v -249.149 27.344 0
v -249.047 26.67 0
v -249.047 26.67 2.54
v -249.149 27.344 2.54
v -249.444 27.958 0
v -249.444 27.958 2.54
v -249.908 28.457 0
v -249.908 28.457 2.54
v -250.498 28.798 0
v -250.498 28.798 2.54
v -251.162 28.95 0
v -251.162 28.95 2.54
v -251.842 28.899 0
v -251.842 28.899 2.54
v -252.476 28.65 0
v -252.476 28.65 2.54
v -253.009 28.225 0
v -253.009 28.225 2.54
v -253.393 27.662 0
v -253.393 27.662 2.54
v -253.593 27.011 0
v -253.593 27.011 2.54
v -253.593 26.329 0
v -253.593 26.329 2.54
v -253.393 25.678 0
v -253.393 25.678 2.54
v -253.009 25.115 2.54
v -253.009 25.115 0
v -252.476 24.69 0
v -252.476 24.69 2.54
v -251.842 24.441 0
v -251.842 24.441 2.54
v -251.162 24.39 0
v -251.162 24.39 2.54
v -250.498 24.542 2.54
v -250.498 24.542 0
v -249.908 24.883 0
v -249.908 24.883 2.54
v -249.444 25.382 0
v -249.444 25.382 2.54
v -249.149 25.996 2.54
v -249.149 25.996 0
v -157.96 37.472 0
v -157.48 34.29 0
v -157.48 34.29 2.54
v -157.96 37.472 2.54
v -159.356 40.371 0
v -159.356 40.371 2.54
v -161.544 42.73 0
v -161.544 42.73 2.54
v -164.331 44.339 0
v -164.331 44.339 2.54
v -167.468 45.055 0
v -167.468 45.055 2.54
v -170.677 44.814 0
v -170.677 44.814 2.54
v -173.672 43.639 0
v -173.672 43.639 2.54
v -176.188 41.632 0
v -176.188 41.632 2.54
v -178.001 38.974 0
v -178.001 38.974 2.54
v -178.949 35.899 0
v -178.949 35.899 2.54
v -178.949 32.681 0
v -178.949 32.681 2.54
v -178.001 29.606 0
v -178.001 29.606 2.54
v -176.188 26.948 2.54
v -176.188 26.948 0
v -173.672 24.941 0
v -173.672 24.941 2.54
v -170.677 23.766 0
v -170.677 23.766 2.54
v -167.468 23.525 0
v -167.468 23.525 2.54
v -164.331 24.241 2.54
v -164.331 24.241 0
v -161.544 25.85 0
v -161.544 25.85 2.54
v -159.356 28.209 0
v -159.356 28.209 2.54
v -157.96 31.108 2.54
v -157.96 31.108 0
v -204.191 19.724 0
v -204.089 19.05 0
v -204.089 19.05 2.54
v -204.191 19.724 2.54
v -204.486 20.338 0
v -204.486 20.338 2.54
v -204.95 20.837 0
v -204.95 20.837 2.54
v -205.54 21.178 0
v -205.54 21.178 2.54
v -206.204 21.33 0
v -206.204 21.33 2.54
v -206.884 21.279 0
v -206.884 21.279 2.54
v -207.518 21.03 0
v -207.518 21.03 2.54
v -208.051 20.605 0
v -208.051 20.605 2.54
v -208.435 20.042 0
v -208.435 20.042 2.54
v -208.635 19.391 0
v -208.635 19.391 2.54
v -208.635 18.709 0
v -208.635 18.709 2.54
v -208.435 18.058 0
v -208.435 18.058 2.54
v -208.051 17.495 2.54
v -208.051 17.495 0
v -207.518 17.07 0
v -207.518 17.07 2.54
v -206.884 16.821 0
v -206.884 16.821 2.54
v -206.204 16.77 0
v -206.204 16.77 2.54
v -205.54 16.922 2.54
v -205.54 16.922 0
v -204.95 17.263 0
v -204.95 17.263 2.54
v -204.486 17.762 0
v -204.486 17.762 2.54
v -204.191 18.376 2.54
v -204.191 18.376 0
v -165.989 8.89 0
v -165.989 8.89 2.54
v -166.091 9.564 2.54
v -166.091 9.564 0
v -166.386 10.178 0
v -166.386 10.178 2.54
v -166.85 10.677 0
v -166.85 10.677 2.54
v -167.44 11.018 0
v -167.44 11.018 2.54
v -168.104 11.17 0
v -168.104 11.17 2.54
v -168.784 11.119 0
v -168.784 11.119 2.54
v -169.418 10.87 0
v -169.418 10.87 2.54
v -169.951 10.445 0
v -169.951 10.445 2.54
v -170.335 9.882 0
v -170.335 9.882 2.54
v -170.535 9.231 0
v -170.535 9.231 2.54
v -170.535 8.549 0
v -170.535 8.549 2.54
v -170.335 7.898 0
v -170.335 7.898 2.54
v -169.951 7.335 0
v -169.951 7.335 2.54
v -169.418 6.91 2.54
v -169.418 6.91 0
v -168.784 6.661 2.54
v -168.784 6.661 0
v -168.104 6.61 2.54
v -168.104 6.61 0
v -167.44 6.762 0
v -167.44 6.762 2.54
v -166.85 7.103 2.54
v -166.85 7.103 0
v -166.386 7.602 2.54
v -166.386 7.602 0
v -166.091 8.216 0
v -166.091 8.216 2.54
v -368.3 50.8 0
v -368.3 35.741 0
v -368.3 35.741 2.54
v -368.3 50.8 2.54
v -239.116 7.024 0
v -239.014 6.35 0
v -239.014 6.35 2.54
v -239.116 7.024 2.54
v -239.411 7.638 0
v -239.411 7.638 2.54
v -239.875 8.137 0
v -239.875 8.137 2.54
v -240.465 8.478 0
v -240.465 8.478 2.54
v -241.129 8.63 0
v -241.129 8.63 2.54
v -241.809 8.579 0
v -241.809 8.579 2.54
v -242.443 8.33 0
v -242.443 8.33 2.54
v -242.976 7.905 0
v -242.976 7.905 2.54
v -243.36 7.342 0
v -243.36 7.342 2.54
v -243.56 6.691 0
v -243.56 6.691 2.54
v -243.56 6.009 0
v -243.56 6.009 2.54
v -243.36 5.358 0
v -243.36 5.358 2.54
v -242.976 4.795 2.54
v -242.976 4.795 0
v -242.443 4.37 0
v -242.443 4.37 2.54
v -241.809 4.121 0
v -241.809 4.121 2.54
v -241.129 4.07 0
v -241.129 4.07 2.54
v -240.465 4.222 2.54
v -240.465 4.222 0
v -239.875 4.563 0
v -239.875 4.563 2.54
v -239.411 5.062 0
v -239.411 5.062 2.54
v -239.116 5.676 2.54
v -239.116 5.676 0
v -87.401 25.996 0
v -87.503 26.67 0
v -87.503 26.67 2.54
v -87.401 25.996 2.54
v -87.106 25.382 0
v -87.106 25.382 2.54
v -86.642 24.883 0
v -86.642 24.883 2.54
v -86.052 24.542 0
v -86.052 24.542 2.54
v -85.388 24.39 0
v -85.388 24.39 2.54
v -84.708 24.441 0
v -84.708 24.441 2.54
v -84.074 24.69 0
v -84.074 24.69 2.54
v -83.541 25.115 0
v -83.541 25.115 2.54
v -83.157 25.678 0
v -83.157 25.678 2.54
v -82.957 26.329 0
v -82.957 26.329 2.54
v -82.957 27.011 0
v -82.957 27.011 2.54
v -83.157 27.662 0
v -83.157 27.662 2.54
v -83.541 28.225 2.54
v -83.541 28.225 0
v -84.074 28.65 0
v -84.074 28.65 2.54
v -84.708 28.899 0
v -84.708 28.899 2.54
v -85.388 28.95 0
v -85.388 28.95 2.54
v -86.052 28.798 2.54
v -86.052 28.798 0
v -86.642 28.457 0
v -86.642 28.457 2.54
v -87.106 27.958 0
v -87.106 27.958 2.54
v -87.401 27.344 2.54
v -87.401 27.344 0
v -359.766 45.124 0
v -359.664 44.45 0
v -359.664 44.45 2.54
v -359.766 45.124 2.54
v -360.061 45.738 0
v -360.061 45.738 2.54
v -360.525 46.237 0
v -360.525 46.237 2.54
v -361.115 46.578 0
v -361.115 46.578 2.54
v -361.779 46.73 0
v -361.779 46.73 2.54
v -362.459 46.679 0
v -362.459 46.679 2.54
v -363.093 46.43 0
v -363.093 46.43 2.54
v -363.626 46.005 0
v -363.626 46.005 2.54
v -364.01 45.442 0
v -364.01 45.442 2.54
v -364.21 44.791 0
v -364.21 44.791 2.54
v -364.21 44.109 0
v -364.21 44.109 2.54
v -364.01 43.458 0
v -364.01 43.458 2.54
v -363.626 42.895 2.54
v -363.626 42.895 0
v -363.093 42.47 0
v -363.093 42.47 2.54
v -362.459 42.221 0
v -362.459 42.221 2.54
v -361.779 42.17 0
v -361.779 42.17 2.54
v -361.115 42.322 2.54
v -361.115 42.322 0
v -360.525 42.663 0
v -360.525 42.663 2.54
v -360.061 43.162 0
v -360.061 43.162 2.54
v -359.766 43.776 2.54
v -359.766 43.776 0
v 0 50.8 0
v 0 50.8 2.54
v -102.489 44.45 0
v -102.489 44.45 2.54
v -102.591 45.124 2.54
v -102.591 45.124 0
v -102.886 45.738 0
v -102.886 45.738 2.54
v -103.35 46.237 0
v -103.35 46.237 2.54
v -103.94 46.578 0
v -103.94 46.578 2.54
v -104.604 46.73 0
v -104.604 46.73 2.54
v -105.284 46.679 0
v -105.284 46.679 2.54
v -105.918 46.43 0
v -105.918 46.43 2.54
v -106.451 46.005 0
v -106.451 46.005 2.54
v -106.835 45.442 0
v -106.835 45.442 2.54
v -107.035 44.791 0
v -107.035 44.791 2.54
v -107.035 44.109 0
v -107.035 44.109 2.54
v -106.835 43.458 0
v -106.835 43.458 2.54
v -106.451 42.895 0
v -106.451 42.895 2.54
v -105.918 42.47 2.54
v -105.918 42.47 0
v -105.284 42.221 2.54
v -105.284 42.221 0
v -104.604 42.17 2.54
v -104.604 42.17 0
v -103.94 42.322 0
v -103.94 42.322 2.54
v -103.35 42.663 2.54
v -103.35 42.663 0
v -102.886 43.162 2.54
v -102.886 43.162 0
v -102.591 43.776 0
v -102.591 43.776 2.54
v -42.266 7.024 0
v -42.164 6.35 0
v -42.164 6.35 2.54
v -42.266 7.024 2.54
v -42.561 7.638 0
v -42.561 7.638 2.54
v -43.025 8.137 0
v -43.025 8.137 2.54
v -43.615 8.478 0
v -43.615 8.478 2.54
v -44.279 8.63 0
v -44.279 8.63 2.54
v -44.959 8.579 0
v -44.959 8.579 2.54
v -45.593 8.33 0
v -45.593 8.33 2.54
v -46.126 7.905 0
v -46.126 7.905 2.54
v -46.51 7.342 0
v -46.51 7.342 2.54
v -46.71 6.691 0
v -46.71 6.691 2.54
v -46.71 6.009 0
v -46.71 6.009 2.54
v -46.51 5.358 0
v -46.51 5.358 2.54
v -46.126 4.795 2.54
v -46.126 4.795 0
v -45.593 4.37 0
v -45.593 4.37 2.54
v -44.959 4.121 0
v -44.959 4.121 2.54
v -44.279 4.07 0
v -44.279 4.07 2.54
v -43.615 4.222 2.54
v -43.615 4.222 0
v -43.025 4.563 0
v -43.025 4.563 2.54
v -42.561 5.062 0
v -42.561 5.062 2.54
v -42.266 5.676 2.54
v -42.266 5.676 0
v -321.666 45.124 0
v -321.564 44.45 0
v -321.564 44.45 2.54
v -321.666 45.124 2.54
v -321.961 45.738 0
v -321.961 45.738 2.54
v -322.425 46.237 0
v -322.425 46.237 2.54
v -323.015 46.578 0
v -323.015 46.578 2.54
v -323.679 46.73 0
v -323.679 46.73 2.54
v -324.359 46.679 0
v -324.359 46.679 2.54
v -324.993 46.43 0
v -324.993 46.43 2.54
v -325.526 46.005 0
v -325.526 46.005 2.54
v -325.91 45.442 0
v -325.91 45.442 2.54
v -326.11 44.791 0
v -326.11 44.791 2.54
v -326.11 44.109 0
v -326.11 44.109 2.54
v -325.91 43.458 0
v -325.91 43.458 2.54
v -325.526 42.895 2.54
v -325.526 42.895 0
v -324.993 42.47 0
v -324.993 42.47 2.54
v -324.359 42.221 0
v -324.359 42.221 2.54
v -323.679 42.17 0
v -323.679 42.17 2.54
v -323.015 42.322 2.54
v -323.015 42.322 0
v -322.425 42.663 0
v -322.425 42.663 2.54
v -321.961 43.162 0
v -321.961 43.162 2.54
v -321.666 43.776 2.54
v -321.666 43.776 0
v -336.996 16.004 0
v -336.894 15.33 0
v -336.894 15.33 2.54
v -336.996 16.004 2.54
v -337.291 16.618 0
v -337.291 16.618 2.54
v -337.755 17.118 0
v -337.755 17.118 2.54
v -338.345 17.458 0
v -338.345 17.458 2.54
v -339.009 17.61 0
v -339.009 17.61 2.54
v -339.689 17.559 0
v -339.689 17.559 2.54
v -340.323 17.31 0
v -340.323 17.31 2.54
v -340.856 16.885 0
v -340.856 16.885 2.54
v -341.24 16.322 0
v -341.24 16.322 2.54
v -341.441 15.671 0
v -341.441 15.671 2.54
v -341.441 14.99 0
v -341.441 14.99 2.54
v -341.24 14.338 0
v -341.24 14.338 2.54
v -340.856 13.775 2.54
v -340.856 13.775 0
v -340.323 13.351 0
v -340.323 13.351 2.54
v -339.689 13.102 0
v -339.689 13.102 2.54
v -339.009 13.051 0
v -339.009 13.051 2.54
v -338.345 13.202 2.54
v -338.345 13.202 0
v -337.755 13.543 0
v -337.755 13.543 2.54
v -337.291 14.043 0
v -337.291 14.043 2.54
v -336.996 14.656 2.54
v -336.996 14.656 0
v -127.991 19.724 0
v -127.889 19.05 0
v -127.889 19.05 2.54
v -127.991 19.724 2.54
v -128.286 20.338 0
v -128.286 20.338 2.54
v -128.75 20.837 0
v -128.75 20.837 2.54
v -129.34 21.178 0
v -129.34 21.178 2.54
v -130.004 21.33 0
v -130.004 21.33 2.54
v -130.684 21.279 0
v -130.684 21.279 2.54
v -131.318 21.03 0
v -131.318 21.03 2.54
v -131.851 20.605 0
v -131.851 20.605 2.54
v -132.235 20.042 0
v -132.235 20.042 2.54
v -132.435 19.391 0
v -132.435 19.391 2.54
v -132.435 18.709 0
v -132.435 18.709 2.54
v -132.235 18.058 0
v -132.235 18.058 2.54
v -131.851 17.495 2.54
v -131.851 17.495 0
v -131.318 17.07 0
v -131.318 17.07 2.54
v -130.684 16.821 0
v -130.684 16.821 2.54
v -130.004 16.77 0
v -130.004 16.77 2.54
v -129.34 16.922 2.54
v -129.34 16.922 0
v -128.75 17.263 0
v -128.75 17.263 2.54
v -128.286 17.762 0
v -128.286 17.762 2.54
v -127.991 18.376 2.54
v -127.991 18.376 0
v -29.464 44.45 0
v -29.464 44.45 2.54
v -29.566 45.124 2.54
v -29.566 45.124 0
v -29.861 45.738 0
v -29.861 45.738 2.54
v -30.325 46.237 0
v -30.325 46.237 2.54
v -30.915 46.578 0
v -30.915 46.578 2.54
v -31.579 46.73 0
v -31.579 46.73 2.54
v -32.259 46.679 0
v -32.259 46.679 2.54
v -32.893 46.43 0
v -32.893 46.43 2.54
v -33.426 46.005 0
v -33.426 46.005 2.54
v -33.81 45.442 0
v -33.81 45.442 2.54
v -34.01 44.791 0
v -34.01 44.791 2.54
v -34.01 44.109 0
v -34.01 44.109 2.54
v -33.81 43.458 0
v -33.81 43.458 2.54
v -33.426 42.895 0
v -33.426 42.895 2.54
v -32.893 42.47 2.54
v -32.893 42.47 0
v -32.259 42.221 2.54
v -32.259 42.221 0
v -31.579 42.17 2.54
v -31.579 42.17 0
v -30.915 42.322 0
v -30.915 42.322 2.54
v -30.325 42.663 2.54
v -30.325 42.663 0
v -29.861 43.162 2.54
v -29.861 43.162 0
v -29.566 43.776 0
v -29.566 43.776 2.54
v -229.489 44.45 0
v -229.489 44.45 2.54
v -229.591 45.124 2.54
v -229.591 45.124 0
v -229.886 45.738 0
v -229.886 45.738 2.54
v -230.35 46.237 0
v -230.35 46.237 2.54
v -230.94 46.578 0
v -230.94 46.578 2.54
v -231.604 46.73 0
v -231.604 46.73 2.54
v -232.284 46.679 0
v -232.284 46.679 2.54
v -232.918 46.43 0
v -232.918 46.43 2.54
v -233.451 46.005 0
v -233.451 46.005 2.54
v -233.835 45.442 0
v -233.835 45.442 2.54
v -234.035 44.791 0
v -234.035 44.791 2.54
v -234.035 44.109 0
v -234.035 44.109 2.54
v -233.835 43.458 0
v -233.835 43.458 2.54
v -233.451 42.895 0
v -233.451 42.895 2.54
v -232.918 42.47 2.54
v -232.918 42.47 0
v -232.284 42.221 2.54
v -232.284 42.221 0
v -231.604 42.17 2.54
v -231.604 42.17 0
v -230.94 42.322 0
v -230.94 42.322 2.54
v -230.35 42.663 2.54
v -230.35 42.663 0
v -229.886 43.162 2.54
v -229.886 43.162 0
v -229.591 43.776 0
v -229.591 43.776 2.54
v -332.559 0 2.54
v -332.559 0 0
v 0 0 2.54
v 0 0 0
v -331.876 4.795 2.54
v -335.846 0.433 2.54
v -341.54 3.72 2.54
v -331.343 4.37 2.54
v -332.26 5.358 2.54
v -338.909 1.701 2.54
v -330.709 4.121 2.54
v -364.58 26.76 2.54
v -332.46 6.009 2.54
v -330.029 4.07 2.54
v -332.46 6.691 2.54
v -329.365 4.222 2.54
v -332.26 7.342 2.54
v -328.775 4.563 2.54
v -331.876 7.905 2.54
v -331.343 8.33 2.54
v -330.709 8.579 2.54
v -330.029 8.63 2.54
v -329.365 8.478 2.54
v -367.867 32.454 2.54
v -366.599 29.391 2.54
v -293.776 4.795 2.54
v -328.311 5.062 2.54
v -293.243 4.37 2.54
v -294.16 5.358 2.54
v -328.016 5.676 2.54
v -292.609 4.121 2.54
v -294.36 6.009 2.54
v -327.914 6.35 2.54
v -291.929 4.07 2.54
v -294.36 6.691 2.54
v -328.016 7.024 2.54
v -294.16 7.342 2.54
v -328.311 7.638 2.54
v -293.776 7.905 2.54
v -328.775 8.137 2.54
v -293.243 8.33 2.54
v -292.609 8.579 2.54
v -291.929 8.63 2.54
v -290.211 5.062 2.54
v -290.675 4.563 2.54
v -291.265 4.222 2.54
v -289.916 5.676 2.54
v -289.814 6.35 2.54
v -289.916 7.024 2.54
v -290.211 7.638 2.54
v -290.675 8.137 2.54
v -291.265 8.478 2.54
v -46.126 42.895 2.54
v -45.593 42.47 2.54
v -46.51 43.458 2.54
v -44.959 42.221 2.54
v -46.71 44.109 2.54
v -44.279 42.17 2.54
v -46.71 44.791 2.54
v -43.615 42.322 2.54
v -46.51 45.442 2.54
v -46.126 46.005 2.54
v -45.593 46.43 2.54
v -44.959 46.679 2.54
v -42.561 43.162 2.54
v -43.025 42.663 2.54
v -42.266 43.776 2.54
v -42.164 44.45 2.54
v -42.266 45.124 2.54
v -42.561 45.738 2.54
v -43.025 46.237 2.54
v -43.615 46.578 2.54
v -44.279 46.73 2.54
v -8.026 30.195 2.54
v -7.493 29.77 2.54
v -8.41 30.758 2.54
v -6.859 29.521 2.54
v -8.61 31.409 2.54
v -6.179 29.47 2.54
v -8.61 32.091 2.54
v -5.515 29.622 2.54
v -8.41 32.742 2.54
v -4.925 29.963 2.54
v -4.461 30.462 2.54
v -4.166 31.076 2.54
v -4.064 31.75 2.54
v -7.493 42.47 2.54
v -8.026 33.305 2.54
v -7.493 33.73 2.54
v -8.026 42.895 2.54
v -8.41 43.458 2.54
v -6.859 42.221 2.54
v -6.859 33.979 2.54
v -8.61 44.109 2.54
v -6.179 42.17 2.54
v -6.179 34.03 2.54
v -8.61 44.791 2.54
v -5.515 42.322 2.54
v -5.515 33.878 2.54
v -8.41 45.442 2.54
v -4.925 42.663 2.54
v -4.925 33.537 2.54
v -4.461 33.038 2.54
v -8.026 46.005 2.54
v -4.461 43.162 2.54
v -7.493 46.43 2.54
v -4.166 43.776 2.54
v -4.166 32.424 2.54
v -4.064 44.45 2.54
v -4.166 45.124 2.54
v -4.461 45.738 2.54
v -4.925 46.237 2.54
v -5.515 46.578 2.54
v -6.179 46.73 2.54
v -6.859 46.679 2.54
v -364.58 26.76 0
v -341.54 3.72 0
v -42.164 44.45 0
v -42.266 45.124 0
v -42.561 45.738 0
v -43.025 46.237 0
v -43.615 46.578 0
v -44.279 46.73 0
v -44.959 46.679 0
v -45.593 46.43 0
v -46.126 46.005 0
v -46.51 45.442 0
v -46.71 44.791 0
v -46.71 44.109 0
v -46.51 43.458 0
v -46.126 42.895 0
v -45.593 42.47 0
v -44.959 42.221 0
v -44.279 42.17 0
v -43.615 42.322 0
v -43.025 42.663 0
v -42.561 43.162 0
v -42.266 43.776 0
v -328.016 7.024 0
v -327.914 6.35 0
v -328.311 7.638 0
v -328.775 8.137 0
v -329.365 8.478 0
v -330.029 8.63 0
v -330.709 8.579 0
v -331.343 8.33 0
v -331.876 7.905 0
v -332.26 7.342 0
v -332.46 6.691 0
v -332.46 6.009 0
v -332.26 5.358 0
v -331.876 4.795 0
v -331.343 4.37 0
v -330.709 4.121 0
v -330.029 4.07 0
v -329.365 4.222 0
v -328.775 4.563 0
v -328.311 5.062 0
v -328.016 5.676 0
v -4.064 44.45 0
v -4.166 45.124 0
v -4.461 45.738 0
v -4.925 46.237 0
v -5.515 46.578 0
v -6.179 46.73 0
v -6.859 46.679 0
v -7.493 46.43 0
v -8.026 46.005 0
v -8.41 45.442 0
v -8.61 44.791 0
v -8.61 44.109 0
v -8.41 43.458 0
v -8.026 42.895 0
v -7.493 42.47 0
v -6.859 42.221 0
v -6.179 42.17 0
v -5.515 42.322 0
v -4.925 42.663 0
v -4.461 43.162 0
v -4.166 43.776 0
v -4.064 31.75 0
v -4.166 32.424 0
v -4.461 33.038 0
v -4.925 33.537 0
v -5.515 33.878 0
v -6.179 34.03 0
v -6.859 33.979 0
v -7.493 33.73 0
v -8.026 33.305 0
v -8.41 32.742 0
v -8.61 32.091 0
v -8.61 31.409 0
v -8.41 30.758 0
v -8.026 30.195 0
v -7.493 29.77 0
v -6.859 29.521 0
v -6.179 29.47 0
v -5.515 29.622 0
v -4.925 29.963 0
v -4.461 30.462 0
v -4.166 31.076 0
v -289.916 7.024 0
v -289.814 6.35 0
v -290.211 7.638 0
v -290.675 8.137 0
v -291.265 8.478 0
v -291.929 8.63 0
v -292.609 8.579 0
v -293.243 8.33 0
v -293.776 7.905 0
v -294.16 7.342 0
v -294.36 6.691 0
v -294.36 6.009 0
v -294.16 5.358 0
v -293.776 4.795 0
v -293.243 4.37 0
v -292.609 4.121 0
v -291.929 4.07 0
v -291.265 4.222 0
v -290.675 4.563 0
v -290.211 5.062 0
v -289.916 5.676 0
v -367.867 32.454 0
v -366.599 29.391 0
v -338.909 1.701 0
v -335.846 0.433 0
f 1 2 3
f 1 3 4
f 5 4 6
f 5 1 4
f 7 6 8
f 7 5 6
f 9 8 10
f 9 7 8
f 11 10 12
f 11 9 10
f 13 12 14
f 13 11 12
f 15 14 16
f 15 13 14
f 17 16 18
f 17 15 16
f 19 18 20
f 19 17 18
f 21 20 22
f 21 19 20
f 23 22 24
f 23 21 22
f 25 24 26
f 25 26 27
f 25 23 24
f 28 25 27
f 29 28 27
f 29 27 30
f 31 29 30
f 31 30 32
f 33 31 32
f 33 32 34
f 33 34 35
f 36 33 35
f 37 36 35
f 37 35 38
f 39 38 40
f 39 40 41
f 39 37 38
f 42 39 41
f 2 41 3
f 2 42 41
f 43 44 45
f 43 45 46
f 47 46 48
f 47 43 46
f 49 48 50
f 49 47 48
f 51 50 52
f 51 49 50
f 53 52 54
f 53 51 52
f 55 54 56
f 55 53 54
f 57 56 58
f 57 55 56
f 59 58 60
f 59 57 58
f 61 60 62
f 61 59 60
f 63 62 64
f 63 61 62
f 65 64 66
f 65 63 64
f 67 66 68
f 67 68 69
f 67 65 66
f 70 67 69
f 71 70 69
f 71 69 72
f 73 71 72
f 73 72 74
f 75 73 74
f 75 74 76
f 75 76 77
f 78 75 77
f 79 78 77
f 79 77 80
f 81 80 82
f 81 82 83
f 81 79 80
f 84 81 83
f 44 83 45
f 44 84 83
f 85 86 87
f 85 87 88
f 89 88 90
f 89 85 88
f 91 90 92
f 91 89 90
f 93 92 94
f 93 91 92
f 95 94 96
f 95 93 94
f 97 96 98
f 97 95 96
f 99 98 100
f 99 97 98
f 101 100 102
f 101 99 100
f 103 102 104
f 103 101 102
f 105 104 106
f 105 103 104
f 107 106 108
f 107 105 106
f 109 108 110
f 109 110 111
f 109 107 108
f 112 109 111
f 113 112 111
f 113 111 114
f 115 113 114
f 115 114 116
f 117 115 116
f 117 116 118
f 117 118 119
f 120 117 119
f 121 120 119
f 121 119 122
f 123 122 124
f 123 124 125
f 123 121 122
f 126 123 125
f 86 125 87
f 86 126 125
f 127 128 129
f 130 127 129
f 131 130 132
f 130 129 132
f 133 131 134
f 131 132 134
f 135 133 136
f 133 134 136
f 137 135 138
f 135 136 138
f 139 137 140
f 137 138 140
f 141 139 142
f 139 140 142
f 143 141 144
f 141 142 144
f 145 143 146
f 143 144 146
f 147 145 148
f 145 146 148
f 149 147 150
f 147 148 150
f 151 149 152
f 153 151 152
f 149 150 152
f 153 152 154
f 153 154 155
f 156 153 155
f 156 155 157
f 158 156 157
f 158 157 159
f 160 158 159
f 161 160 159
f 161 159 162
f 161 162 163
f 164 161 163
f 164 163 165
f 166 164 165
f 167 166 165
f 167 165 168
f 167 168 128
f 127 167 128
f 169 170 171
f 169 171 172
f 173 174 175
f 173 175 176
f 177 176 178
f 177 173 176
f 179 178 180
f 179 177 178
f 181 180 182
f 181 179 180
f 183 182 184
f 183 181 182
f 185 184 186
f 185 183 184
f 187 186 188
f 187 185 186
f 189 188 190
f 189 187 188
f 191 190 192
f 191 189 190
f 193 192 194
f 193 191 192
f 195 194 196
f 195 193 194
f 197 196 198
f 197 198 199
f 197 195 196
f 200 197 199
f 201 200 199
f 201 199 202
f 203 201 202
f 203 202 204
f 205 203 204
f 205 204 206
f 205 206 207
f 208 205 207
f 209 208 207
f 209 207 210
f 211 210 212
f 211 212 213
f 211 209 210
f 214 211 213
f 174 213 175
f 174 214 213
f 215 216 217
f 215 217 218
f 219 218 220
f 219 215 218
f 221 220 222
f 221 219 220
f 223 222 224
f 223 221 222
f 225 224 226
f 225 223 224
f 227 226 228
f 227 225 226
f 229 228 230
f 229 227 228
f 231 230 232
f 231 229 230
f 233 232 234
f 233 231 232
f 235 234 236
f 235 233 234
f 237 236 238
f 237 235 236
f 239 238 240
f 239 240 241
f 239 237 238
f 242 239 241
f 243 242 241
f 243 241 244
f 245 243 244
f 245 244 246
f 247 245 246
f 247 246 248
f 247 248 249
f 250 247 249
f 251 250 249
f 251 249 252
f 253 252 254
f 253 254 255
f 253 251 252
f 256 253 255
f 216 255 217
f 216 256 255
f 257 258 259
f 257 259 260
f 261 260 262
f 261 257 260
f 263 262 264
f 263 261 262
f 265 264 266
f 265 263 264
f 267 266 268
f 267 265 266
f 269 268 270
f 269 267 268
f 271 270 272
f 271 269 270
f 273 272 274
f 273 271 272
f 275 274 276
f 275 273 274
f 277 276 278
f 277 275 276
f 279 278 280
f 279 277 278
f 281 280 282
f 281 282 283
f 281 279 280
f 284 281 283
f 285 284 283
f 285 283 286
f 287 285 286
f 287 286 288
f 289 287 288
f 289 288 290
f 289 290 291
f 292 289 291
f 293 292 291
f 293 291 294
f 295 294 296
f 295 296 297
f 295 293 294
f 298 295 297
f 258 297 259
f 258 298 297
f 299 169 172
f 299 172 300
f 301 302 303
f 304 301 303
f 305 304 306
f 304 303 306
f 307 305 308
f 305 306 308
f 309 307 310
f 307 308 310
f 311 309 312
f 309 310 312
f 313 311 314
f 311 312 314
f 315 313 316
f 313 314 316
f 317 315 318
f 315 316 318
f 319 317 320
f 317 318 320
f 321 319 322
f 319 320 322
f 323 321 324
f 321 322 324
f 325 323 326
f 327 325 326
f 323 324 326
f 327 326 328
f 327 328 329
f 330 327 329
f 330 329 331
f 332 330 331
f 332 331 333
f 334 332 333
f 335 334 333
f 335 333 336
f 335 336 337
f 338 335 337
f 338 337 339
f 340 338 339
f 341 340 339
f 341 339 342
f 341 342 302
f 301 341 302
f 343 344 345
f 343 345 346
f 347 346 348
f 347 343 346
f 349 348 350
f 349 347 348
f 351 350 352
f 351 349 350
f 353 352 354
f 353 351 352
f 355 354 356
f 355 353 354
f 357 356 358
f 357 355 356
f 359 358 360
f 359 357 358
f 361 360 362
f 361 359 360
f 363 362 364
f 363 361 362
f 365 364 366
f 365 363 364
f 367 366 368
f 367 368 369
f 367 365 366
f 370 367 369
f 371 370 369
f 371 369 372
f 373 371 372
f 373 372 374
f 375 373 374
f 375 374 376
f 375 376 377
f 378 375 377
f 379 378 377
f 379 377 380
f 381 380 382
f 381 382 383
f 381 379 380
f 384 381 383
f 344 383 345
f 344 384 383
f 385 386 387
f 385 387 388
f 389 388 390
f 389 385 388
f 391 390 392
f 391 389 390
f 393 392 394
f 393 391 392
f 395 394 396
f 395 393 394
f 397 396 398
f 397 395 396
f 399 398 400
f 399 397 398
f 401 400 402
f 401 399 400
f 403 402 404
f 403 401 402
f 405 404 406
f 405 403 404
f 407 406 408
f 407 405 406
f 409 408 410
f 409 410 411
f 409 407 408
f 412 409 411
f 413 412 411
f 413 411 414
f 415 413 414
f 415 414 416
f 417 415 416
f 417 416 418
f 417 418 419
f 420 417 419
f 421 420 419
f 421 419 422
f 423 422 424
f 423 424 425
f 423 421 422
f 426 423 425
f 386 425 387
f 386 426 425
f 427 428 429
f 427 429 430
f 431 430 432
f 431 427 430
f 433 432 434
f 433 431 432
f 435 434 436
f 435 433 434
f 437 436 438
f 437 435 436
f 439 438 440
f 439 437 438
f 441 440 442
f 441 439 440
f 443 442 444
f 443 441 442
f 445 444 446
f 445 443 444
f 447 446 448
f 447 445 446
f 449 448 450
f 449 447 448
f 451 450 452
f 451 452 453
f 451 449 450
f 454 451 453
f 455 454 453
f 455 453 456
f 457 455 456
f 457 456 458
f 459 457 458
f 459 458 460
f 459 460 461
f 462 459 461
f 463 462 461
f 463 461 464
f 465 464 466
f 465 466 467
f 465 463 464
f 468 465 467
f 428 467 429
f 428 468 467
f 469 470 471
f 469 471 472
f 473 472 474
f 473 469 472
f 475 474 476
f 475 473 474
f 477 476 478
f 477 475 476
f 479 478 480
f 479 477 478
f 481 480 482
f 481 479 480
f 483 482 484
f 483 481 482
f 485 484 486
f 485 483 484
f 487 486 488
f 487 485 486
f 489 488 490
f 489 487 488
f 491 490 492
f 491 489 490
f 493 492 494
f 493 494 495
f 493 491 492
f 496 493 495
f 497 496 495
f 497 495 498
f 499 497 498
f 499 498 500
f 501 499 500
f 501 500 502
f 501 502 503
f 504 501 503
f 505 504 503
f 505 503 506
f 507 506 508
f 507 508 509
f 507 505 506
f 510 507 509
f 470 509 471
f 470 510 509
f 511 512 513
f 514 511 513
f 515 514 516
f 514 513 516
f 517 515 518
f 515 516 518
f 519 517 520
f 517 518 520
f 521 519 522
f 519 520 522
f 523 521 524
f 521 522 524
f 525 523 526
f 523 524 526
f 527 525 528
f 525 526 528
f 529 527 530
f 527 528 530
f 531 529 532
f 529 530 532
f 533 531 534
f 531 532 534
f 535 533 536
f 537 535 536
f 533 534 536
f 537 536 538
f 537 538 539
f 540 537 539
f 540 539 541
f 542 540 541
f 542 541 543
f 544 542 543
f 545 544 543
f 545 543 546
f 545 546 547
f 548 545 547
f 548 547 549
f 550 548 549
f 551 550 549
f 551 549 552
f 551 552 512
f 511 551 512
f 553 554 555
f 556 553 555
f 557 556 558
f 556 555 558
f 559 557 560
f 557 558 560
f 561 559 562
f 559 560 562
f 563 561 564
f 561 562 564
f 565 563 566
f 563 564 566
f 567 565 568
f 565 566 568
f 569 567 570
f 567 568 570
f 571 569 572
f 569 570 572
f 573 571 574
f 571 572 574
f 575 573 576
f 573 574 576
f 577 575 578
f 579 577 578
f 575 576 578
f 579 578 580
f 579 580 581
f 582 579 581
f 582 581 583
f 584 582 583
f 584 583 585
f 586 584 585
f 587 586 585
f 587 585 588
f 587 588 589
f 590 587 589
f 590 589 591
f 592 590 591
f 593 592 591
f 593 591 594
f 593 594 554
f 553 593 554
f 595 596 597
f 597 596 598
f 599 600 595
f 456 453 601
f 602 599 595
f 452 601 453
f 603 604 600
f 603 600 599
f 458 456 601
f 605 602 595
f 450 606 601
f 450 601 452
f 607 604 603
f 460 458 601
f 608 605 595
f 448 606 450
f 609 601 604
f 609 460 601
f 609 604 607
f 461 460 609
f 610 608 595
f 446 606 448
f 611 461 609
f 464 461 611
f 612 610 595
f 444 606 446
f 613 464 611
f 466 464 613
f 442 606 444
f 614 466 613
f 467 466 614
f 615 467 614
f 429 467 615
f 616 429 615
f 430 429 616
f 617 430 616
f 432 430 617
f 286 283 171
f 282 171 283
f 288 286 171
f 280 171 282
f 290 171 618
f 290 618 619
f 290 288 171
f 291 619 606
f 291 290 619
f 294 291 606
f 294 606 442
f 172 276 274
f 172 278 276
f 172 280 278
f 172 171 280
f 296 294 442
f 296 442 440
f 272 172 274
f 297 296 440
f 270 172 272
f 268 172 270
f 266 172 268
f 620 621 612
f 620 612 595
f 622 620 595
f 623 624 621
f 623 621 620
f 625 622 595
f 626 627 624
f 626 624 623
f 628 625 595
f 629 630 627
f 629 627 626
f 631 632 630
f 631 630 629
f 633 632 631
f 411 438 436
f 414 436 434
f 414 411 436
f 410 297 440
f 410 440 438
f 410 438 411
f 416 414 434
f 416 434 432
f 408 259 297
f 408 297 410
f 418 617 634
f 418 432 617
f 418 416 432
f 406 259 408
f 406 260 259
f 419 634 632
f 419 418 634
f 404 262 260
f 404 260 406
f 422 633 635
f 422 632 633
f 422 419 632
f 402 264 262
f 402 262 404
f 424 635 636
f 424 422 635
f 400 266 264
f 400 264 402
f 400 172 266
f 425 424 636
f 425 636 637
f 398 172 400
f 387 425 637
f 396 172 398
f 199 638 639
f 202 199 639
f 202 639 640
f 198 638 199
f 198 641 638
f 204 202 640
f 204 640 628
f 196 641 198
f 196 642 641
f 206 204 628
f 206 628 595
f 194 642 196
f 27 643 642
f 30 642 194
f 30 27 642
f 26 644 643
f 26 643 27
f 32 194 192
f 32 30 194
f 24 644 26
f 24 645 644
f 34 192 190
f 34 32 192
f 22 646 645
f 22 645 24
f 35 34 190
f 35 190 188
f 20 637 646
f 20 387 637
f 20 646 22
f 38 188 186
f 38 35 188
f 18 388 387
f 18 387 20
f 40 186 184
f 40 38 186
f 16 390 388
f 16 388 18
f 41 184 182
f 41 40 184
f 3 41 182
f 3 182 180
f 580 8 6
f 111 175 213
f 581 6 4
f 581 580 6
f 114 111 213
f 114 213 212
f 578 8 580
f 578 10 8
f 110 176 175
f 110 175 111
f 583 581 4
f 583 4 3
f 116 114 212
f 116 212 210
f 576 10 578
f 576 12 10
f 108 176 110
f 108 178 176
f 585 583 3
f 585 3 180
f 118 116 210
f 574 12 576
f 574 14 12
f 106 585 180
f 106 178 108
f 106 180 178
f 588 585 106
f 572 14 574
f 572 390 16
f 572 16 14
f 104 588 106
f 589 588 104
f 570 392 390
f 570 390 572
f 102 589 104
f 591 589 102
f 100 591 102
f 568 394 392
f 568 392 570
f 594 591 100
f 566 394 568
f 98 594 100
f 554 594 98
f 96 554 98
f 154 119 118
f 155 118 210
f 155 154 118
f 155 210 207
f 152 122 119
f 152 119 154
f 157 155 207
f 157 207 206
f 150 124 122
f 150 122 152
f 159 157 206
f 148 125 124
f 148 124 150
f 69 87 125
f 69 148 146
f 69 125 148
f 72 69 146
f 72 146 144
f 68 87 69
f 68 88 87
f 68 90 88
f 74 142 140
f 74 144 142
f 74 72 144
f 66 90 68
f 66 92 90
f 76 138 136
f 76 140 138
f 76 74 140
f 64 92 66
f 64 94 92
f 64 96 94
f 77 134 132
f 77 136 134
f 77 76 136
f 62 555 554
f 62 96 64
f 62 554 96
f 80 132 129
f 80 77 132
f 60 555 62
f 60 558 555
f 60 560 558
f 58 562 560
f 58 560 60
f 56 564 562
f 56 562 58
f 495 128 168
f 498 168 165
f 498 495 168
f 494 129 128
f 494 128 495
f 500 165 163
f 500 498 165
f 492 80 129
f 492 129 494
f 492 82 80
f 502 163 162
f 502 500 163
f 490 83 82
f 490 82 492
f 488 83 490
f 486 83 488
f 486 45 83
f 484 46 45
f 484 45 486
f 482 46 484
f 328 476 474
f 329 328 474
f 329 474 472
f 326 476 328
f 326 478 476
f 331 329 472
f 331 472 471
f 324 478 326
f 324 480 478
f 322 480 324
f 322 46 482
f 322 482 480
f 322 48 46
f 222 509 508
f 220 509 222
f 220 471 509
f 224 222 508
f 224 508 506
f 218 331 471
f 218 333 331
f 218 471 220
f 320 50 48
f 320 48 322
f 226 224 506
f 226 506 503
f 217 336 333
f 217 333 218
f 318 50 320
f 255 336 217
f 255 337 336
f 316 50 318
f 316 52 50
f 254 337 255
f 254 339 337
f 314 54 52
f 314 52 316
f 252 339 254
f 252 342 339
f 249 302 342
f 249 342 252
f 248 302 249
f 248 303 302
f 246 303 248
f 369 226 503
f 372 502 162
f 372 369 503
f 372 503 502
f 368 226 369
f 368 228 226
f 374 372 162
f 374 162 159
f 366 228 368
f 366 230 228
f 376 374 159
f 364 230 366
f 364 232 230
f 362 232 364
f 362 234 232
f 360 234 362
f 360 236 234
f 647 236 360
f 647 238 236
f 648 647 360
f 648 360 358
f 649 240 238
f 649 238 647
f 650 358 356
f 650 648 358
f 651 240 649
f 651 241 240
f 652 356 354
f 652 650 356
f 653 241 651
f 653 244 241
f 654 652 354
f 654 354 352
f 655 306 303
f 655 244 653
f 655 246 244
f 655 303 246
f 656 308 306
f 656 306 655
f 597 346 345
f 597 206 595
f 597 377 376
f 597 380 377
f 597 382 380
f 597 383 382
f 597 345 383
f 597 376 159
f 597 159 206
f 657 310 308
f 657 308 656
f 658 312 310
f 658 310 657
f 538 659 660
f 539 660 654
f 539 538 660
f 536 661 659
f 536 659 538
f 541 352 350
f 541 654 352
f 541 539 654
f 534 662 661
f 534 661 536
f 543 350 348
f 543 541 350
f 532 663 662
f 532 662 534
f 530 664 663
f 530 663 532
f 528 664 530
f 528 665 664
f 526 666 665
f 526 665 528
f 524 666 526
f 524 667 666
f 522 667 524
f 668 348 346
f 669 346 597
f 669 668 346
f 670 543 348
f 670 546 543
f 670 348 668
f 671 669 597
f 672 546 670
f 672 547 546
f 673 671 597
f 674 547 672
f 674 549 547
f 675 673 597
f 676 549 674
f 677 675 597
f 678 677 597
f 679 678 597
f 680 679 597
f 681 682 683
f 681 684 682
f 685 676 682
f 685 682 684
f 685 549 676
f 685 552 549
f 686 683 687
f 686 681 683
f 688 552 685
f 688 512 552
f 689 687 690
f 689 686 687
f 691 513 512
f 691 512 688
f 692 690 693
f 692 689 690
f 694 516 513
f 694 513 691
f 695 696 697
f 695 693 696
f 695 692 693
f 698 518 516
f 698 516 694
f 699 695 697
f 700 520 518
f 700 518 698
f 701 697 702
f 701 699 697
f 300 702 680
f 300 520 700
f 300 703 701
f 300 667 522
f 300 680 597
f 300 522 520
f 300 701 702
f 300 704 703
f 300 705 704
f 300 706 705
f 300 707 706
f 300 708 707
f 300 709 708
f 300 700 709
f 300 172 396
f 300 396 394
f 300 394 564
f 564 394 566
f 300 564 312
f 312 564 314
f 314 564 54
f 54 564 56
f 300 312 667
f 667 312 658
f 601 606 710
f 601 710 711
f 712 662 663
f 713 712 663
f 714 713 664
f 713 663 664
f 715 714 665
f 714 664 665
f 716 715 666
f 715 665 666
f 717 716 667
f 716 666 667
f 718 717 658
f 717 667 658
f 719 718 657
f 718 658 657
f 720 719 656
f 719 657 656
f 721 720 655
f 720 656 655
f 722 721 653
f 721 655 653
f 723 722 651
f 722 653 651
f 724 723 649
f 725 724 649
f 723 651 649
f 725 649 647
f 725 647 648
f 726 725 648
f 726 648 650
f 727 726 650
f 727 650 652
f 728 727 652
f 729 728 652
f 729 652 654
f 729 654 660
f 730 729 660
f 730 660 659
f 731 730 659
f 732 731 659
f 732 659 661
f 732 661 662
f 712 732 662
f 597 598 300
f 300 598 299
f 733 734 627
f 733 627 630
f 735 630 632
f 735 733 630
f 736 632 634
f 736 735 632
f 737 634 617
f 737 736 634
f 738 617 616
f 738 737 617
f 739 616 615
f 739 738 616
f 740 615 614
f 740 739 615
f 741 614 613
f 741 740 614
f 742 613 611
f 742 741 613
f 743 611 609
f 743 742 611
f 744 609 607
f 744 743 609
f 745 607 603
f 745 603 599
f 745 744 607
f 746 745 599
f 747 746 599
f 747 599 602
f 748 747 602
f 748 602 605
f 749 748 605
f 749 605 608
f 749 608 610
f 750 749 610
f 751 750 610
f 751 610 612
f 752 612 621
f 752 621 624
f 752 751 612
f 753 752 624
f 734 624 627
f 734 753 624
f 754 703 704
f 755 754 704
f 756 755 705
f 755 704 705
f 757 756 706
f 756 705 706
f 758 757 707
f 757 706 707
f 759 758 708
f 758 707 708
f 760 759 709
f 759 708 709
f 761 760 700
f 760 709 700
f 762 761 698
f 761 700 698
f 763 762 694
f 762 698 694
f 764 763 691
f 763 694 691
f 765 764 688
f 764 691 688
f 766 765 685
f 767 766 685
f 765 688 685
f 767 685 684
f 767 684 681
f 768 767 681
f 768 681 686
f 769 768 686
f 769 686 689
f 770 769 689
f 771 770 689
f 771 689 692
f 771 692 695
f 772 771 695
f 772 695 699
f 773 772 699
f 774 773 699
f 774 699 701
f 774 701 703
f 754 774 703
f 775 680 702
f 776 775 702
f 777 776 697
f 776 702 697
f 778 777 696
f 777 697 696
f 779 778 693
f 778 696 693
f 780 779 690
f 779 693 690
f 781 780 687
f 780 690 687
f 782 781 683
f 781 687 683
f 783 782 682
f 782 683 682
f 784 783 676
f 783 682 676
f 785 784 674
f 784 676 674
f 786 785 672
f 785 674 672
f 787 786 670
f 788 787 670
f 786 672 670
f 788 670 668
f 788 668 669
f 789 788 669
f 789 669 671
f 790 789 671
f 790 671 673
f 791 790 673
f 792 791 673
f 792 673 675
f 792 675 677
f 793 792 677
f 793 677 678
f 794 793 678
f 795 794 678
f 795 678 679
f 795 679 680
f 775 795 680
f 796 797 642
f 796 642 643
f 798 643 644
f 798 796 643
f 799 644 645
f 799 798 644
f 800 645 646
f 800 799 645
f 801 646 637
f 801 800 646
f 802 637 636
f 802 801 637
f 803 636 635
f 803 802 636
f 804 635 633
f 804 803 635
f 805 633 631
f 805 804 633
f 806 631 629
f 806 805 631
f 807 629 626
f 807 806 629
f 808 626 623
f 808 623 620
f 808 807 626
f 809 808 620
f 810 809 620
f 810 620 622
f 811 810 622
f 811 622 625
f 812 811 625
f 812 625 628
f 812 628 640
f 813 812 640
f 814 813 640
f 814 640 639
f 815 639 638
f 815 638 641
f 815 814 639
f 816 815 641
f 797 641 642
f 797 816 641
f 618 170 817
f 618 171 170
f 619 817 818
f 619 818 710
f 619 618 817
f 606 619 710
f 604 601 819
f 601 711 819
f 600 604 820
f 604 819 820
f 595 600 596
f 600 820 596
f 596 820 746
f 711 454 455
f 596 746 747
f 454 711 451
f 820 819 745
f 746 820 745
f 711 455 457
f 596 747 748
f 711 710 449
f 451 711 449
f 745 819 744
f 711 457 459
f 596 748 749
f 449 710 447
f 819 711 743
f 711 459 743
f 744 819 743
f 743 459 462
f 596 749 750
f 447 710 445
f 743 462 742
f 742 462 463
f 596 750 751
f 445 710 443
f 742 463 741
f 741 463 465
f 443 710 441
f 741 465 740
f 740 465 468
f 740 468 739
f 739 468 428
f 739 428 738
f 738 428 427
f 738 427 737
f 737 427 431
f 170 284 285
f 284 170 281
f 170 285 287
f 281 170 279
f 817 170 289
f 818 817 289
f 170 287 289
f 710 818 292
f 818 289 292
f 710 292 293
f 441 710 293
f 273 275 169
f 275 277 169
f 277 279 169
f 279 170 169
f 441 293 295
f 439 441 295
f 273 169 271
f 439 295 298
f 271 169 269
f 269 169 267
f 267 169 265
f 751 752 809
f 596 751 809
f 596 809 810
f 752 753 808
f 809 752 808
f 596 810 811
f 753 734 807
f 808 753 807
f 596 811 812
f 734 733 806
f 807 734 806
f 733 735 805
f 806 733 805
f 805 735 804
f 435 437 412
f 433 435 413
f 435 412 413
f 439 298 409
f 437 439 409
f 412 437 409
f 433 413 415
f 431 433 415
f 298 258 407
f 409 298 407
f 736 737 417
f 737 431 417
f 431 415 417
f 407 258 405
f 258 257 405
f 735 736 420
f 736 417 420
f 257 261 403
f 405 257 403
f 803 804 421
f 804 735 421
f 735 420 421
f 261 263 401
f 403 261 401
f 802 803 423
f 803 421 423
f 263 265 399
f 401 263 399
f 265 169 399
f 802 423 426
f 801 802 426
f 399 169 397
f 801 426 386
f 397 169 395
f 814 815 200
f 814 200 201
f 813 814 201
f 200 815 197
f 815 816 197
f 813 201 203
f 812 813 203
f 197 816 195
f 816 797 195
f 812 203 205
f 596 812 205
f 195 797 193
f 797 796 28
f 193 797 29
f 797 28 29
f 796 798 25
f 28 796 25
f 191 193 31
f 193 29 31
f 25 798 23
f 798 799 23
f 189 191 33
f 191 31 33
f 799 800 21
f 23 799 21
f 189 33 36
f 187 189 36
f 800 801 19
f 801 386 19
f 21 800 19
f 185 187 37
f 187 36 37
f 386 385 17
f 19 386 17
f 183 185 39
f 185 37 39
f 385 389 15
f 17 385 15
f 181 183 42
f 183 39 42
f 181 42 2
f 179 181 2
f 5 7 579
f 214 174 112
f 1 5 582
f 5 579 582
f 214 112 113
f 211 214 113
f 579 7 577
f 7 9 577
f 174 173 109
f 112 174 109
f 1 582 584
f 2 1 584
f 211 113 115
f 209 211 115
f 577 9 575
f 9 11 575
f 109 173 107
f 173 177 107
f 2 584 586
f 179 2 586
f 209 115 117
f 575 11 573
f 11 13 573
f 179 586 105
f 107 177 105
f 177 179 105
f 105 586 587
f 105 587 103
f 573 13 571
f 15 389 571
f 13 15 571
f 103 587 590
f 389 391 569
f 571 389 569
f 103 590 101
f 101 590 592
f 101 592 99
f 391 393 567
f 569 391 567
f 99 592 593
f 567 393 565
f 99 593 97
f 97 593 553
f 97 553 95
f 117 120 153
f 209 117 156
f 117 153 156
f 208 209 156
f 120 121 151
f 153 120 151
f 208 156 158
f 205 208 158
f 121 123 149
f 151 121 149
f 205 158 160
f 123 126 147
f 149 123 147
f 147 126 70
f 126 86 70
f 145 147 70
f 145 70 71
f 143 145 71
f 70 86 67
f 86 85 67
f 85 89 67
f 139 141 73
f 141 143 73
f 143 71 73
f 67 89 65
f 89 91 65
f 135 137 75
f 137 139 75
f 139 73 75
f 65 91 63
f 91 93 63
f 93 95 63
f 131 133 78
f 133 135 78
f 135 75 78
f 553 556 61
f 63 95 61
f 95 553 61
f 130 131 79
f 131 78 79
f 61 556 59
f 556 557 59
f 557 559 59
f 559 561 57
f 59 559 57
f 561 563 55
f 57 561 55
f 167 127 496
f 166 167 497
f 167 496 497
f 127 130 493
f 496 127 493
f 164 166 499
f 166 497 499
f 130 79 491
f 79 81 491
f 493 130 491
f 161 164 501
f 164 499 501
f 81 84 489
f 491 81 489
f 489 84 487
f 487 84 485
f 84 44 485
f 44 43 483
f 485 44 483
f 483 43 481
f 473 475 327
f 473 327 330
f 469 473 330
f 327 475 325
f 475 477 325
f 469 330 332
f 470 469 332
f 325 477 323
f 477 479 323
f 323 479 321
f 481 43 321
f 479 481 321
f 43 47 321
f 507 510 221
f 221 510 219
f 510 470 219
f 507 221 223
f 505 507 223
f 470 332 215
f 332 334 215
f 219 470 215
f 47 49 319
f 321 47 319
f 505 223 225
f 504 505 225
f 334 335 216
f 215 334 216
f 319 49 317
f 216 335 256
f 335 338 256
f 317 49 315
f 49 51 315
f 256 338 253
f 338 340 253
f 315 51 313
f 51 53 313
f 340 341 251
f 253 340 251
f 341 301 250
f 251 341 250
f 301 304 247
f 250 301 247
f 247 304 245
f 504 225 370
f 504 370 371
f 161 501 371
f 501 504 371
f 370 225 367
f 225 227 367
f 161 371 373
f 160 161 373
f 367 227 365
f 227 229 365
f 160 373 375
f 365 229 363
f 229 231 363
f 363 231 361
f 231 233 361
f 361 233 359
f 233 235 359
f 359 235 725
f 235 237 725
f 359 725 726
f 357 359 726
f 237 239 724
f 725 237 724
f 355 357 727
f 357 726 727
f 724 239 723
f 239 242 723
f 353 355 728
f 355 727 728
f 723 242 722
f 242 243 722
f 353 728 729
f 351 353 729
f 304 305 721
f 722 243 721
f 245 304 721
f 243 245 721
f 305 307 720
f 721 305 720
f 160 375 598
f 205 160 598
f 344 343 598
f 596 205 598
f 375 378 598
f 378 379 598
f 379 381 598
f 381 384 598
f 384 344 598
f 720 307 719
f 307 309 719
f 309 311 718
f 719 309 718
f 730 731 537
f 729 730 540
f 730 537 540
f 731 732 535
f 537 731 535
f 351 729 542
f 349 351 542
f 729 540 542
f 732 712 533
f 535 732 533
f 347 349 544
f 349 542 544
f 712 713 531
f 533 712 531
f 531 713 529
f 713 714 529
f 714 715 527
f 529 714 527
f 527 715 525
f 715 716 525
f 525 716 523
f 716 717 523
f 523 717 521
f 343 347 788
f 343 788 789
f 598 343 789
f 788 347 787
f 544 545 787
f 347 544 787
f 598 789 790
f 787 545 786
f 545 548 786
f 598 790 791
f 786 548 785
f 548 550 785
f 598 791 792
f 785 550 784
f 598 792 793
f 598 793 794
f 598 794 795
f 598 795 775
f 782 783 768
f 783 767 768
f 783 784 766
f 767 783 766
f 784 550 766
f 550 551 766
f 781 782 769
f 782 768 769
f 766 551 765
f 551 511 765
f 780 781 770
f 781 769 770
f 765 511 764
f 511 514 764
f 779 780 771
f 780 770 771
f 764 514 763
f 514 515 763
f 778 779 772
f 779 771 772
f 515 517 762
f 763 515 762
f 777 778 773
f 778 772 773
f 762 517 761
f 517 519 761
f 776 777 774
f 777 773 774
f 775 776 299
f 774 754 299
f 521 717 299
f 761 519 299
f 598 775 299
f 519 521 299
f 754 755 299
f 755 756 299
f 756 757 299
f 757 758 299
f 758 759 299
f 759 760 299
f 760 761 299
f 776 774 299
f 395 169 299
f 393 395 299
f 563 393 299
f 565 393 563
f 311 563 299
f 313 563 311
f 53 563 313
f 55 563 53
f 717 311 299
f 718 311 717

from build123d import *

# Parameters (mm, degrees)
SKETCH1_W           = 368.3
SKETCH1_H           = 50.8
SKETCH1_R           = 2.286
SKETCH1_R_2         = 10.795
BOSS_EXTRUDE1_DEPTH = 2.54
CUT_EXTRUDE1_DEPTH  = 2.54
FILLET1_R           = 12.7
SKETCH4_R           = 2.286
CUT_EXTRUDE3_DEPTH  = 372.795618048
SKETCH5_R           = 2.286
CUT_EXTRUDE4_DEPTH  = 372.795618048


with BuildPart() as part:
    # Sketch1 → Boss-Extrude1 (new body)
    with BuildSketch(Plane.XY):
        with Locations((-184.15, 25.4)):
            Rectangle(SKETCH1_W, SKETCH1_H)
        with Locations((-44.45, 6.35)):
            Circle(SKETCH1_R, mode=Mode.SUBTRACT)
        with Locations((-292.1, 6.35)):
            Circle(SKETCH1_R, mode=Mode.SUBTRACT)
        with Locations((-130.175, 19.05)):
            Circle(SKETCH1_R, mode=Mode.SUBTRACT)
        with Locations((-206.375, 19.05)):
            Circle(SKETCH1_R, mode=Mode.SUBTRACT)
        with Locations((-168.275, 34.29)):
            Circle(SKETCH1_R_2, mode=Mode.SUBTRACT)
        with Locations((-251.333, 26.67)):
            Circle(SKETCH1_R, mode=Mode.SUBTRACT)
        with Locations(Location((-85.217, 26.67, 0), (0, 0, 180))):
            Circle(SKETCH1_R, mode=Mode.SUBTRACT)
        with Locations((-330.2, 6.35)):
            Circle(SKETCH1_R, mode=Mode.SUBTRACT)
        with Locations((-241.3, 6.35)):
            Circle(SKETCH1_R, mode=Mode.SUBTRACT)
        with Locations((-361.95, 44.45)):
            Circle(SKETCH1_R, mode=Mode.SUBTRACT)
        with Locations((-323.85, 44.45)):
            Circle(SKETCH1_R, mode=Mode.SUBTRACT)
        with Locations((-339.180256121, 15.330256121)):
            Circle(SKETCH1_R, mode=Mode.SUBTRACT)
    extrude(amount=BOSS_EXTRUDE1_DEPTH)

    # Sketch2 → Cut-Extrude1 (cut)
    with BuildSketch(Plane.XY.offset(2.54)):
        Polygon((-388.62, 50.8), (-337.82, 0), (-388.62, 0), align=None)
    extrude(amount=-CUT_EXTRUDE1_DEPTH, mode=Mode.SUBTRACT)

    # Fillet1
    fillet1_edges = [part.edges().sort_by_distance(p)[0] for p in [
        (-337.82, 0, 1.27),
        (-368.3, 30.48, 1.27),
    ]]
    fillet(fillet1_edges, radius=FILLET1_R)

    # Sketch4 → Cut-Extrude3 (cut, through all)
    with BuildSketch(Plane.XY.offset(2.54)):
        with Locations((-231.775, 44.45)):
            Circle(SKETCH4_R)
        with Locations((-104.775, 44.45)):
            Circle(SKETCH4_R)
        with Locations((-168.275, 8.89)):
            Circle(SKETCH4_R)
    extrude(amount=-CUT_EXTRUDE3_DEPTH, mode=Mode.SUBTRACT)

    # Sketch5 → Cut-Extrude4 (cut, through all)
    with BuildSketch(Plane.XY.offset(2.54)):
        with Locations((-44.45, 44.45)):
            Circle(SKETCH5_R)
        with Locations((-31.75, 44.45)):
            Circle(SKETCH5_R)
        with Locations((-6.35, 44.45)):
            Circle(SKETCH5_R)
        with Locations((-6.35, 31.75)):
            Circle(SKETCH5_R)
    extrude(amount=-CUT_EXTRUDE4_DEPTH, mode=Mode.SUBTRACT)


solid = part.part
